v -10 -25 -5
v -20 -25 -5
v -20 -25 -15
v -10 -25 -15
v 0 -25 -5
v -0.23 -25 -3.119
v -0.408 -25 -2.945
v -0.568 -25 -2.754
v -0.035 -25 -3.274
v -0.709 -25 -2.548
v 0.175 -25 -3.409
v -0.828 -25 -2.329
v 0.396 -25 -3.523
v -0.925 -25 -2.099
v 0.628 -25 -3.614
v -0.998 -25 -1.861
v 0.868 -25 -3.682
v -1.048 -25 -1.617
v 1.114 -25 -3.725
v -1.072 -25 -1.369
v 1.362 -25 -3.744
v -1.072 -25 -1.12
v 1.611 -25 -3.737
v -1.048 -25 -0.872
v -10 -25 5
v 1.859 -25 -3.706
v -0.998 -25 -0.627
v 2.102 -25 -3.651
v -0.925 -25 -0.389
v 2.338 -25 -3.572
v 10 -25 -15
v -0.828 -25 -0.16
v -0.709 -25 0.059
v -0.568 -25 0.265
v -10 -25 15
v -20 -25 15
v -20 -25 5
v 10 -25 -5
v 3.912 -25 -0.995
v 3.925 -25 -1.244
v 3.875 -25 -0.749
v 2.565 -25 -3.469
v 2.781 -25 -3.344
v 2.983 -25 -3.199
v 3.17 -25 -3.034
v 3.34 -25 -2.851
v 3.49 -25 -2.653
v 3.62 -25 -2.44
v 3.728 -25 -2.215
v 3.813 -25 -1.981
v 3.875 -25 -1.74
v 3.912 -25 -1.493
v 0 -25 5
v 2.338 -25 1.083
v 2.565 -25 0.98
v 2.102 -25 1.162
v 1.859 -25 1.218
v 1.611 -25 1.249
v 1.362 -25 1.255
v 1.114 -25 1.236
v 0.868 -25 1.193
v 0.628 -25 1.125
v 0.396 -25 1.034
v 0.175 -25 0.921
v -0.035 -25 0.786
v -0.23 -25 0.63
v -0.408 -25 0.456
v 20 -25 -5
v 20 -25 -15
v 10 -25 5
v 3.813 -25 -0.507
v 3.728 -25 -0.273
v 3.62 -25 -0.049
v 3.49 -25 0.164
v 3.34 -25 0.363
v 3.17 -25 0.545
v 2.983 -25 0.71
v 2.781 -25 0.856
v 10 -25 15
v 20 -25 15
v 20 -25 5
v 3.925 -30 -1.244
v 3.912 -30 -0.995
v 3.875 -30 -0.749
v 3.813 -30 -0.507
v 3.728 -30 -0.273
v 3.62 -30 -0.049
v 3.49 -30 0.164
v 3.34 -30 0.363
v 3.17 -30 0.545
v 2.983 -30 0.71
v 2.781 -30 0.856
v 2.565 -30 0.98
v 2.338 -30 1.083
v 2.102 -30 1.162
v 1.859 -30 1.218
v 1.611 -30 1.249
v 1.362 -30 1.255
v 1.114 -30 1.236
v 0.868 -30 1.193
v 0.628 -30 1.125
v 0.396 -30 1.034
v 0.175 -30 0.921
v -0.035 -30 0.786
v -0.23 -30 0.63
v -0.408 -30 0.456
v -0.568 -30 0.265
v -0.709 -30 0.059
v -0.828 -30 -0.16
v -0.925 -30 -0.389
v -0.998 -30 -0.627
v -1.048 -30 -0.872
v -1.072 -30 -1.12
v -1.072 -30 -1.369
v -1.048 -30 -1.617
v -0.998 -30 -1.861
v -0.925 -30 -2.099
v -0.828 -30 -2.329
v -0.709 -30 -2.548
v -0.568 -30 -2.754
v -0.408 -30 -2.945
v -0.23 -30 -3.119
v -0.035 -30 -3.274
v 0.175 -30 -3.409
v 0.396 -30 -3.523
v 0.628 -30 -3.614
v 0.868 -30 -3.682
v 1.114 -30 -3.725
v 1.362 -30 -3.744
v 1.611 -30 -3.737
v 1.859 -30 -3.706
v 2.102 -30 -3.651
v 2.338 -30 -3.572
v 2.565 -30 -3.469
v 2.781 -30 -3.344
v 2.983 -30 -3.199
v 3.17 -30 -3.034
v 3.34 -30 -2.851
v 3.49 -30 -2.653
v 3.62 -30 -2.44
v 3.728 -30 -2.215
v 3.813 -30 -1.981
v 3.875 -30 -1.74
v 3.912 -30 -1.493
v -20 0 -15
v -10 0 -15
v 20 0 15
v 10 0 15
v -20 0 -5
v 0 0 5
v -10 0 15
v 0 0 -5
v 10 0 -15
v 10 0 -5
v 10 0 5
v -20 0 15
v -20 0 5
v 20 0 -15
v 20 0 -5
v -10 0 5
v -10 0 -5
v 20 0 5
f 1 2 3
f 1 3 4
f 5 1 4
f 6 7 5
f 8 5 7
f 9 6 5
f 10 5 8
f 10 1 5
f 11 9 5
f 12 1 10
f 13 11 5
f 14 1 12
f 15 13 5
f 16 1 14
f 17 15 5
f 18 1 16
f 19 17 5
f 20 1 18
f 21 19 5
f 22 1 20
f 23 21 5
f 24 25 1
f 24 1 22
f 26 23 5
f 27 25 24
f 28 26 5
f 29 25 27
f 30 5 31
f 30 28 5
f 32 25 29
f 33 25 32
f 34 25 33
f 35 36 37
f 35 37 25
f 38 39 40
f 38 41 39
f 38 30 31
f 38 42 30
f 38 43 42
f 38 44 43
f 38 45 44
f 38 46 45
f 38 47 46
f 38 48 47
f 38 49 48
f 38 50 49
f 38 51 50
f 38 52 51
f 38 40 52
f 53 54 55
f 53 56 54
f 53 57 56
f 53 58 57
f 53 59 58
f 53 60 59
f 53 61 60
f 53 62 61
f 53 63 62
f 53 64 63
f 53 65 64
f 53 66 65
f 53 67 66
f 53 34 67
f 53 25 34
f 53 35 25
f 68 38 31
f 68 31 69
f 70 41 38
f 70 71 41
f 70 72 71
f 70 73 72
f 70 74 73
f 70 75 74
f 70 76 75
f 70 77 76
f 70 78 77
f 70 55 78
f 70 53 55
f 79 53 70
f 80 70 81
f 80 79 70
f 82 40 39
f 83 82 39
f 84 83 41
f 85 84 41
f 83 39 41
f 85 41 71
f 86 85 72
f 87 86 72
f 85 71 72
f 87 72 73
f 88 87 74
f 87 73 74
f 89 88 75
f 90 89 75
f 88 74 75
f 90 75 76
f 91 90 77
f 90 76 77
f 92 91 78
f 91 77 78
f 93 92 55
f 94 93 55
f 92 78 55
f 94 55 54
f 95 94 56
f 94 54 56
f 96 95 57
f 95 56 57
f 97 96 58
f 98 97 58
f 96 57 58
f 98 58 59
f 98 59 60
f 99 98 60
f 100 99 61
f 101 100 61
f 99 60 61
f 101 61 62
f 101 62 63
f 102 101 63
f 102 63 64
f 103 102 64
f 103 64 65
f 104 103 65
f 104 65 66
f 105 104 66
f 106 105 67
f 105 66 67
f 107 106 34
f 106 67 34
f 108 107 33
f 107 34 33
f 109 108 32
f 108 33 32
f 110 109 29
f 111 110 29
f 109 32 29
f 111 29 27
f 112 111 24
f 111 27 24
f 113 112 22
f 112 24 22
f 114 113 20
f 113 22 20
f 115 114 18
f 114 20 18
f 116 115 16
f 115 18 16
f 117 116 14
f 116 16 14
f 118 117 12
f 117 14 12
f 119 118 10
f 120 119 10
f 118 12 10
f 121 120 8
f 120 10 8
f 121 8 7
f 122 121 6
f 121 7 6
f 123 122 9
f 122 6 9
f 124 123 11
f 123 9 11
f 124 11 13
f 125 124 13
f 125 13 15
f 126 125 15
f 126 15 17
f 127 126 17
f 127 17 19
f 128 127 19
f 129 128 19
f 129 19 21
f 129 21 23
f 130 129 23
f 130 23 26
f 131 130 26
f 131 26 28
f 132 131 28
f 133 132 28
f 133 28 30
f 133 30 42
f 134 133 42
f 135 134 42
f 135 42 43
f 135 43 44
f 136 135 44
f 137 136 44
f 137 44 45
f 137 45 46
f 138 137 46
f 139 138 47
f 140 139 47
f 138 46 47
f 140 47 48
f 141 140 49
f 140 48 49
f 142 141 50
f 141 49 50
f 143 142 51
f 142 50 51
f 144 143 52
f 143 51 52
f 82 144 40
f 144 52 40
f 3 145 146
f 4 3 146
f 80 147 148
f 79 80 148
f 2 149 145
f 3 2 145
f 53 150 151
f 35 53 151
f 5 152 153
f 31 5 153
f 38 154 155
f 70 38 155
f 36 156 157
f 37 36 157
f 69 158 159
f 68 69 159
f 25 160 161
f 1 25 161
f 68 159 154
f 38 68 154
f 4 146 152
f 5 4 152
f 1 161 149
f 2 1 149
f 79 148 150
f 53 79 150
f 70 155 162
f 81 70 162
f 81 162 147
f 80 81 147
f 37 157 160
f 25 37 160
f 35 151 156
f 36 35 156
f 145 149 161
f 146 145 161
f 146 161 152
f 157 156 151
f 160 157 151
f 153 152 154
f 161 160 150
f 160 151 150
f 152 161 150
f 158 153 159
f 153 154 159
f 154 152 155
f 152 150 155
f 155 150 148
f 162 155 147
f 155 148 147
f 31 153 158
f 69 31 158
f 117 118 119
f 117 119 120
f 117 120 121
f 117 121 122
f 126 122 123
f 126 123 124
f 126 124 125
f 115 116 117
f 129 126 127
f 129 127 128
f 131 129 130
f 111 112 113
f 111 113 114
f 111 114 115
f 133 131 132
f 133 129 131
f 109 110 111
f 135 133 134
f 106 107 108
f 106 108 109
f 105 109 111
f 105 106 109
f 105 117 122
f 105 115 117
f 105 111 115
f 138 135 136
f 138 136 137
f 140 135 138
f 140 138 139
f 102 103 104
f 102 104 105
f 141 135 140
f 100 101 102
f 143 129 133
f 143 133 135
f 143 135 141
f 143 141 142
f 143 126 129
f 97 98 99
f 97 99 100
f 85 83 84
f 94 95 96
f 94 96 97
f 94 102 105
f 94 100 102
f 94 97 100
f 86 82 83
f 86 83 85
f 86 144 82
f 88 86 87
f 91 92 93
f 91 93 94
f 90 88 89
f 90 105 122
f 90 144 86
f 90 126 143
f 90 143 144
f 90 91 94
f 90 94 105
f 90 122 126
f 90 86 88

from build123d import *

# Parameters (mm, degrees)
F1_DEPTH = 25
F3_R     = 2.5
F4_DEPTH = 5


with BuildPart() as f1:
    # F0 (on Front) → F1 (new body)
    with BuildSketch(Plane.XZ):
        Polygon((-10, 5), (-10, 0), (-10, -5), (-20, -5), (-20, -15), (-10, -15), (0, -5), (10, -15), (20, -15), (20, -5), (10, -5), (10, 0), (10, 5), (20, 5), (20, 15), (10, 15), (0, 5), (-10, 15), (-20, 15), (-20, 5), align=None)
    extrude(amount=F1_DEPTH)

    # F3 (on face) → F4 (join)
    with BuildSketch(Plane.XZ.offset(25)):
        with Locations((1.424529, -1.24434)):
            Circle(F3_R)
    extrude(amount=F4_DEPTH)


solid = f1.part
